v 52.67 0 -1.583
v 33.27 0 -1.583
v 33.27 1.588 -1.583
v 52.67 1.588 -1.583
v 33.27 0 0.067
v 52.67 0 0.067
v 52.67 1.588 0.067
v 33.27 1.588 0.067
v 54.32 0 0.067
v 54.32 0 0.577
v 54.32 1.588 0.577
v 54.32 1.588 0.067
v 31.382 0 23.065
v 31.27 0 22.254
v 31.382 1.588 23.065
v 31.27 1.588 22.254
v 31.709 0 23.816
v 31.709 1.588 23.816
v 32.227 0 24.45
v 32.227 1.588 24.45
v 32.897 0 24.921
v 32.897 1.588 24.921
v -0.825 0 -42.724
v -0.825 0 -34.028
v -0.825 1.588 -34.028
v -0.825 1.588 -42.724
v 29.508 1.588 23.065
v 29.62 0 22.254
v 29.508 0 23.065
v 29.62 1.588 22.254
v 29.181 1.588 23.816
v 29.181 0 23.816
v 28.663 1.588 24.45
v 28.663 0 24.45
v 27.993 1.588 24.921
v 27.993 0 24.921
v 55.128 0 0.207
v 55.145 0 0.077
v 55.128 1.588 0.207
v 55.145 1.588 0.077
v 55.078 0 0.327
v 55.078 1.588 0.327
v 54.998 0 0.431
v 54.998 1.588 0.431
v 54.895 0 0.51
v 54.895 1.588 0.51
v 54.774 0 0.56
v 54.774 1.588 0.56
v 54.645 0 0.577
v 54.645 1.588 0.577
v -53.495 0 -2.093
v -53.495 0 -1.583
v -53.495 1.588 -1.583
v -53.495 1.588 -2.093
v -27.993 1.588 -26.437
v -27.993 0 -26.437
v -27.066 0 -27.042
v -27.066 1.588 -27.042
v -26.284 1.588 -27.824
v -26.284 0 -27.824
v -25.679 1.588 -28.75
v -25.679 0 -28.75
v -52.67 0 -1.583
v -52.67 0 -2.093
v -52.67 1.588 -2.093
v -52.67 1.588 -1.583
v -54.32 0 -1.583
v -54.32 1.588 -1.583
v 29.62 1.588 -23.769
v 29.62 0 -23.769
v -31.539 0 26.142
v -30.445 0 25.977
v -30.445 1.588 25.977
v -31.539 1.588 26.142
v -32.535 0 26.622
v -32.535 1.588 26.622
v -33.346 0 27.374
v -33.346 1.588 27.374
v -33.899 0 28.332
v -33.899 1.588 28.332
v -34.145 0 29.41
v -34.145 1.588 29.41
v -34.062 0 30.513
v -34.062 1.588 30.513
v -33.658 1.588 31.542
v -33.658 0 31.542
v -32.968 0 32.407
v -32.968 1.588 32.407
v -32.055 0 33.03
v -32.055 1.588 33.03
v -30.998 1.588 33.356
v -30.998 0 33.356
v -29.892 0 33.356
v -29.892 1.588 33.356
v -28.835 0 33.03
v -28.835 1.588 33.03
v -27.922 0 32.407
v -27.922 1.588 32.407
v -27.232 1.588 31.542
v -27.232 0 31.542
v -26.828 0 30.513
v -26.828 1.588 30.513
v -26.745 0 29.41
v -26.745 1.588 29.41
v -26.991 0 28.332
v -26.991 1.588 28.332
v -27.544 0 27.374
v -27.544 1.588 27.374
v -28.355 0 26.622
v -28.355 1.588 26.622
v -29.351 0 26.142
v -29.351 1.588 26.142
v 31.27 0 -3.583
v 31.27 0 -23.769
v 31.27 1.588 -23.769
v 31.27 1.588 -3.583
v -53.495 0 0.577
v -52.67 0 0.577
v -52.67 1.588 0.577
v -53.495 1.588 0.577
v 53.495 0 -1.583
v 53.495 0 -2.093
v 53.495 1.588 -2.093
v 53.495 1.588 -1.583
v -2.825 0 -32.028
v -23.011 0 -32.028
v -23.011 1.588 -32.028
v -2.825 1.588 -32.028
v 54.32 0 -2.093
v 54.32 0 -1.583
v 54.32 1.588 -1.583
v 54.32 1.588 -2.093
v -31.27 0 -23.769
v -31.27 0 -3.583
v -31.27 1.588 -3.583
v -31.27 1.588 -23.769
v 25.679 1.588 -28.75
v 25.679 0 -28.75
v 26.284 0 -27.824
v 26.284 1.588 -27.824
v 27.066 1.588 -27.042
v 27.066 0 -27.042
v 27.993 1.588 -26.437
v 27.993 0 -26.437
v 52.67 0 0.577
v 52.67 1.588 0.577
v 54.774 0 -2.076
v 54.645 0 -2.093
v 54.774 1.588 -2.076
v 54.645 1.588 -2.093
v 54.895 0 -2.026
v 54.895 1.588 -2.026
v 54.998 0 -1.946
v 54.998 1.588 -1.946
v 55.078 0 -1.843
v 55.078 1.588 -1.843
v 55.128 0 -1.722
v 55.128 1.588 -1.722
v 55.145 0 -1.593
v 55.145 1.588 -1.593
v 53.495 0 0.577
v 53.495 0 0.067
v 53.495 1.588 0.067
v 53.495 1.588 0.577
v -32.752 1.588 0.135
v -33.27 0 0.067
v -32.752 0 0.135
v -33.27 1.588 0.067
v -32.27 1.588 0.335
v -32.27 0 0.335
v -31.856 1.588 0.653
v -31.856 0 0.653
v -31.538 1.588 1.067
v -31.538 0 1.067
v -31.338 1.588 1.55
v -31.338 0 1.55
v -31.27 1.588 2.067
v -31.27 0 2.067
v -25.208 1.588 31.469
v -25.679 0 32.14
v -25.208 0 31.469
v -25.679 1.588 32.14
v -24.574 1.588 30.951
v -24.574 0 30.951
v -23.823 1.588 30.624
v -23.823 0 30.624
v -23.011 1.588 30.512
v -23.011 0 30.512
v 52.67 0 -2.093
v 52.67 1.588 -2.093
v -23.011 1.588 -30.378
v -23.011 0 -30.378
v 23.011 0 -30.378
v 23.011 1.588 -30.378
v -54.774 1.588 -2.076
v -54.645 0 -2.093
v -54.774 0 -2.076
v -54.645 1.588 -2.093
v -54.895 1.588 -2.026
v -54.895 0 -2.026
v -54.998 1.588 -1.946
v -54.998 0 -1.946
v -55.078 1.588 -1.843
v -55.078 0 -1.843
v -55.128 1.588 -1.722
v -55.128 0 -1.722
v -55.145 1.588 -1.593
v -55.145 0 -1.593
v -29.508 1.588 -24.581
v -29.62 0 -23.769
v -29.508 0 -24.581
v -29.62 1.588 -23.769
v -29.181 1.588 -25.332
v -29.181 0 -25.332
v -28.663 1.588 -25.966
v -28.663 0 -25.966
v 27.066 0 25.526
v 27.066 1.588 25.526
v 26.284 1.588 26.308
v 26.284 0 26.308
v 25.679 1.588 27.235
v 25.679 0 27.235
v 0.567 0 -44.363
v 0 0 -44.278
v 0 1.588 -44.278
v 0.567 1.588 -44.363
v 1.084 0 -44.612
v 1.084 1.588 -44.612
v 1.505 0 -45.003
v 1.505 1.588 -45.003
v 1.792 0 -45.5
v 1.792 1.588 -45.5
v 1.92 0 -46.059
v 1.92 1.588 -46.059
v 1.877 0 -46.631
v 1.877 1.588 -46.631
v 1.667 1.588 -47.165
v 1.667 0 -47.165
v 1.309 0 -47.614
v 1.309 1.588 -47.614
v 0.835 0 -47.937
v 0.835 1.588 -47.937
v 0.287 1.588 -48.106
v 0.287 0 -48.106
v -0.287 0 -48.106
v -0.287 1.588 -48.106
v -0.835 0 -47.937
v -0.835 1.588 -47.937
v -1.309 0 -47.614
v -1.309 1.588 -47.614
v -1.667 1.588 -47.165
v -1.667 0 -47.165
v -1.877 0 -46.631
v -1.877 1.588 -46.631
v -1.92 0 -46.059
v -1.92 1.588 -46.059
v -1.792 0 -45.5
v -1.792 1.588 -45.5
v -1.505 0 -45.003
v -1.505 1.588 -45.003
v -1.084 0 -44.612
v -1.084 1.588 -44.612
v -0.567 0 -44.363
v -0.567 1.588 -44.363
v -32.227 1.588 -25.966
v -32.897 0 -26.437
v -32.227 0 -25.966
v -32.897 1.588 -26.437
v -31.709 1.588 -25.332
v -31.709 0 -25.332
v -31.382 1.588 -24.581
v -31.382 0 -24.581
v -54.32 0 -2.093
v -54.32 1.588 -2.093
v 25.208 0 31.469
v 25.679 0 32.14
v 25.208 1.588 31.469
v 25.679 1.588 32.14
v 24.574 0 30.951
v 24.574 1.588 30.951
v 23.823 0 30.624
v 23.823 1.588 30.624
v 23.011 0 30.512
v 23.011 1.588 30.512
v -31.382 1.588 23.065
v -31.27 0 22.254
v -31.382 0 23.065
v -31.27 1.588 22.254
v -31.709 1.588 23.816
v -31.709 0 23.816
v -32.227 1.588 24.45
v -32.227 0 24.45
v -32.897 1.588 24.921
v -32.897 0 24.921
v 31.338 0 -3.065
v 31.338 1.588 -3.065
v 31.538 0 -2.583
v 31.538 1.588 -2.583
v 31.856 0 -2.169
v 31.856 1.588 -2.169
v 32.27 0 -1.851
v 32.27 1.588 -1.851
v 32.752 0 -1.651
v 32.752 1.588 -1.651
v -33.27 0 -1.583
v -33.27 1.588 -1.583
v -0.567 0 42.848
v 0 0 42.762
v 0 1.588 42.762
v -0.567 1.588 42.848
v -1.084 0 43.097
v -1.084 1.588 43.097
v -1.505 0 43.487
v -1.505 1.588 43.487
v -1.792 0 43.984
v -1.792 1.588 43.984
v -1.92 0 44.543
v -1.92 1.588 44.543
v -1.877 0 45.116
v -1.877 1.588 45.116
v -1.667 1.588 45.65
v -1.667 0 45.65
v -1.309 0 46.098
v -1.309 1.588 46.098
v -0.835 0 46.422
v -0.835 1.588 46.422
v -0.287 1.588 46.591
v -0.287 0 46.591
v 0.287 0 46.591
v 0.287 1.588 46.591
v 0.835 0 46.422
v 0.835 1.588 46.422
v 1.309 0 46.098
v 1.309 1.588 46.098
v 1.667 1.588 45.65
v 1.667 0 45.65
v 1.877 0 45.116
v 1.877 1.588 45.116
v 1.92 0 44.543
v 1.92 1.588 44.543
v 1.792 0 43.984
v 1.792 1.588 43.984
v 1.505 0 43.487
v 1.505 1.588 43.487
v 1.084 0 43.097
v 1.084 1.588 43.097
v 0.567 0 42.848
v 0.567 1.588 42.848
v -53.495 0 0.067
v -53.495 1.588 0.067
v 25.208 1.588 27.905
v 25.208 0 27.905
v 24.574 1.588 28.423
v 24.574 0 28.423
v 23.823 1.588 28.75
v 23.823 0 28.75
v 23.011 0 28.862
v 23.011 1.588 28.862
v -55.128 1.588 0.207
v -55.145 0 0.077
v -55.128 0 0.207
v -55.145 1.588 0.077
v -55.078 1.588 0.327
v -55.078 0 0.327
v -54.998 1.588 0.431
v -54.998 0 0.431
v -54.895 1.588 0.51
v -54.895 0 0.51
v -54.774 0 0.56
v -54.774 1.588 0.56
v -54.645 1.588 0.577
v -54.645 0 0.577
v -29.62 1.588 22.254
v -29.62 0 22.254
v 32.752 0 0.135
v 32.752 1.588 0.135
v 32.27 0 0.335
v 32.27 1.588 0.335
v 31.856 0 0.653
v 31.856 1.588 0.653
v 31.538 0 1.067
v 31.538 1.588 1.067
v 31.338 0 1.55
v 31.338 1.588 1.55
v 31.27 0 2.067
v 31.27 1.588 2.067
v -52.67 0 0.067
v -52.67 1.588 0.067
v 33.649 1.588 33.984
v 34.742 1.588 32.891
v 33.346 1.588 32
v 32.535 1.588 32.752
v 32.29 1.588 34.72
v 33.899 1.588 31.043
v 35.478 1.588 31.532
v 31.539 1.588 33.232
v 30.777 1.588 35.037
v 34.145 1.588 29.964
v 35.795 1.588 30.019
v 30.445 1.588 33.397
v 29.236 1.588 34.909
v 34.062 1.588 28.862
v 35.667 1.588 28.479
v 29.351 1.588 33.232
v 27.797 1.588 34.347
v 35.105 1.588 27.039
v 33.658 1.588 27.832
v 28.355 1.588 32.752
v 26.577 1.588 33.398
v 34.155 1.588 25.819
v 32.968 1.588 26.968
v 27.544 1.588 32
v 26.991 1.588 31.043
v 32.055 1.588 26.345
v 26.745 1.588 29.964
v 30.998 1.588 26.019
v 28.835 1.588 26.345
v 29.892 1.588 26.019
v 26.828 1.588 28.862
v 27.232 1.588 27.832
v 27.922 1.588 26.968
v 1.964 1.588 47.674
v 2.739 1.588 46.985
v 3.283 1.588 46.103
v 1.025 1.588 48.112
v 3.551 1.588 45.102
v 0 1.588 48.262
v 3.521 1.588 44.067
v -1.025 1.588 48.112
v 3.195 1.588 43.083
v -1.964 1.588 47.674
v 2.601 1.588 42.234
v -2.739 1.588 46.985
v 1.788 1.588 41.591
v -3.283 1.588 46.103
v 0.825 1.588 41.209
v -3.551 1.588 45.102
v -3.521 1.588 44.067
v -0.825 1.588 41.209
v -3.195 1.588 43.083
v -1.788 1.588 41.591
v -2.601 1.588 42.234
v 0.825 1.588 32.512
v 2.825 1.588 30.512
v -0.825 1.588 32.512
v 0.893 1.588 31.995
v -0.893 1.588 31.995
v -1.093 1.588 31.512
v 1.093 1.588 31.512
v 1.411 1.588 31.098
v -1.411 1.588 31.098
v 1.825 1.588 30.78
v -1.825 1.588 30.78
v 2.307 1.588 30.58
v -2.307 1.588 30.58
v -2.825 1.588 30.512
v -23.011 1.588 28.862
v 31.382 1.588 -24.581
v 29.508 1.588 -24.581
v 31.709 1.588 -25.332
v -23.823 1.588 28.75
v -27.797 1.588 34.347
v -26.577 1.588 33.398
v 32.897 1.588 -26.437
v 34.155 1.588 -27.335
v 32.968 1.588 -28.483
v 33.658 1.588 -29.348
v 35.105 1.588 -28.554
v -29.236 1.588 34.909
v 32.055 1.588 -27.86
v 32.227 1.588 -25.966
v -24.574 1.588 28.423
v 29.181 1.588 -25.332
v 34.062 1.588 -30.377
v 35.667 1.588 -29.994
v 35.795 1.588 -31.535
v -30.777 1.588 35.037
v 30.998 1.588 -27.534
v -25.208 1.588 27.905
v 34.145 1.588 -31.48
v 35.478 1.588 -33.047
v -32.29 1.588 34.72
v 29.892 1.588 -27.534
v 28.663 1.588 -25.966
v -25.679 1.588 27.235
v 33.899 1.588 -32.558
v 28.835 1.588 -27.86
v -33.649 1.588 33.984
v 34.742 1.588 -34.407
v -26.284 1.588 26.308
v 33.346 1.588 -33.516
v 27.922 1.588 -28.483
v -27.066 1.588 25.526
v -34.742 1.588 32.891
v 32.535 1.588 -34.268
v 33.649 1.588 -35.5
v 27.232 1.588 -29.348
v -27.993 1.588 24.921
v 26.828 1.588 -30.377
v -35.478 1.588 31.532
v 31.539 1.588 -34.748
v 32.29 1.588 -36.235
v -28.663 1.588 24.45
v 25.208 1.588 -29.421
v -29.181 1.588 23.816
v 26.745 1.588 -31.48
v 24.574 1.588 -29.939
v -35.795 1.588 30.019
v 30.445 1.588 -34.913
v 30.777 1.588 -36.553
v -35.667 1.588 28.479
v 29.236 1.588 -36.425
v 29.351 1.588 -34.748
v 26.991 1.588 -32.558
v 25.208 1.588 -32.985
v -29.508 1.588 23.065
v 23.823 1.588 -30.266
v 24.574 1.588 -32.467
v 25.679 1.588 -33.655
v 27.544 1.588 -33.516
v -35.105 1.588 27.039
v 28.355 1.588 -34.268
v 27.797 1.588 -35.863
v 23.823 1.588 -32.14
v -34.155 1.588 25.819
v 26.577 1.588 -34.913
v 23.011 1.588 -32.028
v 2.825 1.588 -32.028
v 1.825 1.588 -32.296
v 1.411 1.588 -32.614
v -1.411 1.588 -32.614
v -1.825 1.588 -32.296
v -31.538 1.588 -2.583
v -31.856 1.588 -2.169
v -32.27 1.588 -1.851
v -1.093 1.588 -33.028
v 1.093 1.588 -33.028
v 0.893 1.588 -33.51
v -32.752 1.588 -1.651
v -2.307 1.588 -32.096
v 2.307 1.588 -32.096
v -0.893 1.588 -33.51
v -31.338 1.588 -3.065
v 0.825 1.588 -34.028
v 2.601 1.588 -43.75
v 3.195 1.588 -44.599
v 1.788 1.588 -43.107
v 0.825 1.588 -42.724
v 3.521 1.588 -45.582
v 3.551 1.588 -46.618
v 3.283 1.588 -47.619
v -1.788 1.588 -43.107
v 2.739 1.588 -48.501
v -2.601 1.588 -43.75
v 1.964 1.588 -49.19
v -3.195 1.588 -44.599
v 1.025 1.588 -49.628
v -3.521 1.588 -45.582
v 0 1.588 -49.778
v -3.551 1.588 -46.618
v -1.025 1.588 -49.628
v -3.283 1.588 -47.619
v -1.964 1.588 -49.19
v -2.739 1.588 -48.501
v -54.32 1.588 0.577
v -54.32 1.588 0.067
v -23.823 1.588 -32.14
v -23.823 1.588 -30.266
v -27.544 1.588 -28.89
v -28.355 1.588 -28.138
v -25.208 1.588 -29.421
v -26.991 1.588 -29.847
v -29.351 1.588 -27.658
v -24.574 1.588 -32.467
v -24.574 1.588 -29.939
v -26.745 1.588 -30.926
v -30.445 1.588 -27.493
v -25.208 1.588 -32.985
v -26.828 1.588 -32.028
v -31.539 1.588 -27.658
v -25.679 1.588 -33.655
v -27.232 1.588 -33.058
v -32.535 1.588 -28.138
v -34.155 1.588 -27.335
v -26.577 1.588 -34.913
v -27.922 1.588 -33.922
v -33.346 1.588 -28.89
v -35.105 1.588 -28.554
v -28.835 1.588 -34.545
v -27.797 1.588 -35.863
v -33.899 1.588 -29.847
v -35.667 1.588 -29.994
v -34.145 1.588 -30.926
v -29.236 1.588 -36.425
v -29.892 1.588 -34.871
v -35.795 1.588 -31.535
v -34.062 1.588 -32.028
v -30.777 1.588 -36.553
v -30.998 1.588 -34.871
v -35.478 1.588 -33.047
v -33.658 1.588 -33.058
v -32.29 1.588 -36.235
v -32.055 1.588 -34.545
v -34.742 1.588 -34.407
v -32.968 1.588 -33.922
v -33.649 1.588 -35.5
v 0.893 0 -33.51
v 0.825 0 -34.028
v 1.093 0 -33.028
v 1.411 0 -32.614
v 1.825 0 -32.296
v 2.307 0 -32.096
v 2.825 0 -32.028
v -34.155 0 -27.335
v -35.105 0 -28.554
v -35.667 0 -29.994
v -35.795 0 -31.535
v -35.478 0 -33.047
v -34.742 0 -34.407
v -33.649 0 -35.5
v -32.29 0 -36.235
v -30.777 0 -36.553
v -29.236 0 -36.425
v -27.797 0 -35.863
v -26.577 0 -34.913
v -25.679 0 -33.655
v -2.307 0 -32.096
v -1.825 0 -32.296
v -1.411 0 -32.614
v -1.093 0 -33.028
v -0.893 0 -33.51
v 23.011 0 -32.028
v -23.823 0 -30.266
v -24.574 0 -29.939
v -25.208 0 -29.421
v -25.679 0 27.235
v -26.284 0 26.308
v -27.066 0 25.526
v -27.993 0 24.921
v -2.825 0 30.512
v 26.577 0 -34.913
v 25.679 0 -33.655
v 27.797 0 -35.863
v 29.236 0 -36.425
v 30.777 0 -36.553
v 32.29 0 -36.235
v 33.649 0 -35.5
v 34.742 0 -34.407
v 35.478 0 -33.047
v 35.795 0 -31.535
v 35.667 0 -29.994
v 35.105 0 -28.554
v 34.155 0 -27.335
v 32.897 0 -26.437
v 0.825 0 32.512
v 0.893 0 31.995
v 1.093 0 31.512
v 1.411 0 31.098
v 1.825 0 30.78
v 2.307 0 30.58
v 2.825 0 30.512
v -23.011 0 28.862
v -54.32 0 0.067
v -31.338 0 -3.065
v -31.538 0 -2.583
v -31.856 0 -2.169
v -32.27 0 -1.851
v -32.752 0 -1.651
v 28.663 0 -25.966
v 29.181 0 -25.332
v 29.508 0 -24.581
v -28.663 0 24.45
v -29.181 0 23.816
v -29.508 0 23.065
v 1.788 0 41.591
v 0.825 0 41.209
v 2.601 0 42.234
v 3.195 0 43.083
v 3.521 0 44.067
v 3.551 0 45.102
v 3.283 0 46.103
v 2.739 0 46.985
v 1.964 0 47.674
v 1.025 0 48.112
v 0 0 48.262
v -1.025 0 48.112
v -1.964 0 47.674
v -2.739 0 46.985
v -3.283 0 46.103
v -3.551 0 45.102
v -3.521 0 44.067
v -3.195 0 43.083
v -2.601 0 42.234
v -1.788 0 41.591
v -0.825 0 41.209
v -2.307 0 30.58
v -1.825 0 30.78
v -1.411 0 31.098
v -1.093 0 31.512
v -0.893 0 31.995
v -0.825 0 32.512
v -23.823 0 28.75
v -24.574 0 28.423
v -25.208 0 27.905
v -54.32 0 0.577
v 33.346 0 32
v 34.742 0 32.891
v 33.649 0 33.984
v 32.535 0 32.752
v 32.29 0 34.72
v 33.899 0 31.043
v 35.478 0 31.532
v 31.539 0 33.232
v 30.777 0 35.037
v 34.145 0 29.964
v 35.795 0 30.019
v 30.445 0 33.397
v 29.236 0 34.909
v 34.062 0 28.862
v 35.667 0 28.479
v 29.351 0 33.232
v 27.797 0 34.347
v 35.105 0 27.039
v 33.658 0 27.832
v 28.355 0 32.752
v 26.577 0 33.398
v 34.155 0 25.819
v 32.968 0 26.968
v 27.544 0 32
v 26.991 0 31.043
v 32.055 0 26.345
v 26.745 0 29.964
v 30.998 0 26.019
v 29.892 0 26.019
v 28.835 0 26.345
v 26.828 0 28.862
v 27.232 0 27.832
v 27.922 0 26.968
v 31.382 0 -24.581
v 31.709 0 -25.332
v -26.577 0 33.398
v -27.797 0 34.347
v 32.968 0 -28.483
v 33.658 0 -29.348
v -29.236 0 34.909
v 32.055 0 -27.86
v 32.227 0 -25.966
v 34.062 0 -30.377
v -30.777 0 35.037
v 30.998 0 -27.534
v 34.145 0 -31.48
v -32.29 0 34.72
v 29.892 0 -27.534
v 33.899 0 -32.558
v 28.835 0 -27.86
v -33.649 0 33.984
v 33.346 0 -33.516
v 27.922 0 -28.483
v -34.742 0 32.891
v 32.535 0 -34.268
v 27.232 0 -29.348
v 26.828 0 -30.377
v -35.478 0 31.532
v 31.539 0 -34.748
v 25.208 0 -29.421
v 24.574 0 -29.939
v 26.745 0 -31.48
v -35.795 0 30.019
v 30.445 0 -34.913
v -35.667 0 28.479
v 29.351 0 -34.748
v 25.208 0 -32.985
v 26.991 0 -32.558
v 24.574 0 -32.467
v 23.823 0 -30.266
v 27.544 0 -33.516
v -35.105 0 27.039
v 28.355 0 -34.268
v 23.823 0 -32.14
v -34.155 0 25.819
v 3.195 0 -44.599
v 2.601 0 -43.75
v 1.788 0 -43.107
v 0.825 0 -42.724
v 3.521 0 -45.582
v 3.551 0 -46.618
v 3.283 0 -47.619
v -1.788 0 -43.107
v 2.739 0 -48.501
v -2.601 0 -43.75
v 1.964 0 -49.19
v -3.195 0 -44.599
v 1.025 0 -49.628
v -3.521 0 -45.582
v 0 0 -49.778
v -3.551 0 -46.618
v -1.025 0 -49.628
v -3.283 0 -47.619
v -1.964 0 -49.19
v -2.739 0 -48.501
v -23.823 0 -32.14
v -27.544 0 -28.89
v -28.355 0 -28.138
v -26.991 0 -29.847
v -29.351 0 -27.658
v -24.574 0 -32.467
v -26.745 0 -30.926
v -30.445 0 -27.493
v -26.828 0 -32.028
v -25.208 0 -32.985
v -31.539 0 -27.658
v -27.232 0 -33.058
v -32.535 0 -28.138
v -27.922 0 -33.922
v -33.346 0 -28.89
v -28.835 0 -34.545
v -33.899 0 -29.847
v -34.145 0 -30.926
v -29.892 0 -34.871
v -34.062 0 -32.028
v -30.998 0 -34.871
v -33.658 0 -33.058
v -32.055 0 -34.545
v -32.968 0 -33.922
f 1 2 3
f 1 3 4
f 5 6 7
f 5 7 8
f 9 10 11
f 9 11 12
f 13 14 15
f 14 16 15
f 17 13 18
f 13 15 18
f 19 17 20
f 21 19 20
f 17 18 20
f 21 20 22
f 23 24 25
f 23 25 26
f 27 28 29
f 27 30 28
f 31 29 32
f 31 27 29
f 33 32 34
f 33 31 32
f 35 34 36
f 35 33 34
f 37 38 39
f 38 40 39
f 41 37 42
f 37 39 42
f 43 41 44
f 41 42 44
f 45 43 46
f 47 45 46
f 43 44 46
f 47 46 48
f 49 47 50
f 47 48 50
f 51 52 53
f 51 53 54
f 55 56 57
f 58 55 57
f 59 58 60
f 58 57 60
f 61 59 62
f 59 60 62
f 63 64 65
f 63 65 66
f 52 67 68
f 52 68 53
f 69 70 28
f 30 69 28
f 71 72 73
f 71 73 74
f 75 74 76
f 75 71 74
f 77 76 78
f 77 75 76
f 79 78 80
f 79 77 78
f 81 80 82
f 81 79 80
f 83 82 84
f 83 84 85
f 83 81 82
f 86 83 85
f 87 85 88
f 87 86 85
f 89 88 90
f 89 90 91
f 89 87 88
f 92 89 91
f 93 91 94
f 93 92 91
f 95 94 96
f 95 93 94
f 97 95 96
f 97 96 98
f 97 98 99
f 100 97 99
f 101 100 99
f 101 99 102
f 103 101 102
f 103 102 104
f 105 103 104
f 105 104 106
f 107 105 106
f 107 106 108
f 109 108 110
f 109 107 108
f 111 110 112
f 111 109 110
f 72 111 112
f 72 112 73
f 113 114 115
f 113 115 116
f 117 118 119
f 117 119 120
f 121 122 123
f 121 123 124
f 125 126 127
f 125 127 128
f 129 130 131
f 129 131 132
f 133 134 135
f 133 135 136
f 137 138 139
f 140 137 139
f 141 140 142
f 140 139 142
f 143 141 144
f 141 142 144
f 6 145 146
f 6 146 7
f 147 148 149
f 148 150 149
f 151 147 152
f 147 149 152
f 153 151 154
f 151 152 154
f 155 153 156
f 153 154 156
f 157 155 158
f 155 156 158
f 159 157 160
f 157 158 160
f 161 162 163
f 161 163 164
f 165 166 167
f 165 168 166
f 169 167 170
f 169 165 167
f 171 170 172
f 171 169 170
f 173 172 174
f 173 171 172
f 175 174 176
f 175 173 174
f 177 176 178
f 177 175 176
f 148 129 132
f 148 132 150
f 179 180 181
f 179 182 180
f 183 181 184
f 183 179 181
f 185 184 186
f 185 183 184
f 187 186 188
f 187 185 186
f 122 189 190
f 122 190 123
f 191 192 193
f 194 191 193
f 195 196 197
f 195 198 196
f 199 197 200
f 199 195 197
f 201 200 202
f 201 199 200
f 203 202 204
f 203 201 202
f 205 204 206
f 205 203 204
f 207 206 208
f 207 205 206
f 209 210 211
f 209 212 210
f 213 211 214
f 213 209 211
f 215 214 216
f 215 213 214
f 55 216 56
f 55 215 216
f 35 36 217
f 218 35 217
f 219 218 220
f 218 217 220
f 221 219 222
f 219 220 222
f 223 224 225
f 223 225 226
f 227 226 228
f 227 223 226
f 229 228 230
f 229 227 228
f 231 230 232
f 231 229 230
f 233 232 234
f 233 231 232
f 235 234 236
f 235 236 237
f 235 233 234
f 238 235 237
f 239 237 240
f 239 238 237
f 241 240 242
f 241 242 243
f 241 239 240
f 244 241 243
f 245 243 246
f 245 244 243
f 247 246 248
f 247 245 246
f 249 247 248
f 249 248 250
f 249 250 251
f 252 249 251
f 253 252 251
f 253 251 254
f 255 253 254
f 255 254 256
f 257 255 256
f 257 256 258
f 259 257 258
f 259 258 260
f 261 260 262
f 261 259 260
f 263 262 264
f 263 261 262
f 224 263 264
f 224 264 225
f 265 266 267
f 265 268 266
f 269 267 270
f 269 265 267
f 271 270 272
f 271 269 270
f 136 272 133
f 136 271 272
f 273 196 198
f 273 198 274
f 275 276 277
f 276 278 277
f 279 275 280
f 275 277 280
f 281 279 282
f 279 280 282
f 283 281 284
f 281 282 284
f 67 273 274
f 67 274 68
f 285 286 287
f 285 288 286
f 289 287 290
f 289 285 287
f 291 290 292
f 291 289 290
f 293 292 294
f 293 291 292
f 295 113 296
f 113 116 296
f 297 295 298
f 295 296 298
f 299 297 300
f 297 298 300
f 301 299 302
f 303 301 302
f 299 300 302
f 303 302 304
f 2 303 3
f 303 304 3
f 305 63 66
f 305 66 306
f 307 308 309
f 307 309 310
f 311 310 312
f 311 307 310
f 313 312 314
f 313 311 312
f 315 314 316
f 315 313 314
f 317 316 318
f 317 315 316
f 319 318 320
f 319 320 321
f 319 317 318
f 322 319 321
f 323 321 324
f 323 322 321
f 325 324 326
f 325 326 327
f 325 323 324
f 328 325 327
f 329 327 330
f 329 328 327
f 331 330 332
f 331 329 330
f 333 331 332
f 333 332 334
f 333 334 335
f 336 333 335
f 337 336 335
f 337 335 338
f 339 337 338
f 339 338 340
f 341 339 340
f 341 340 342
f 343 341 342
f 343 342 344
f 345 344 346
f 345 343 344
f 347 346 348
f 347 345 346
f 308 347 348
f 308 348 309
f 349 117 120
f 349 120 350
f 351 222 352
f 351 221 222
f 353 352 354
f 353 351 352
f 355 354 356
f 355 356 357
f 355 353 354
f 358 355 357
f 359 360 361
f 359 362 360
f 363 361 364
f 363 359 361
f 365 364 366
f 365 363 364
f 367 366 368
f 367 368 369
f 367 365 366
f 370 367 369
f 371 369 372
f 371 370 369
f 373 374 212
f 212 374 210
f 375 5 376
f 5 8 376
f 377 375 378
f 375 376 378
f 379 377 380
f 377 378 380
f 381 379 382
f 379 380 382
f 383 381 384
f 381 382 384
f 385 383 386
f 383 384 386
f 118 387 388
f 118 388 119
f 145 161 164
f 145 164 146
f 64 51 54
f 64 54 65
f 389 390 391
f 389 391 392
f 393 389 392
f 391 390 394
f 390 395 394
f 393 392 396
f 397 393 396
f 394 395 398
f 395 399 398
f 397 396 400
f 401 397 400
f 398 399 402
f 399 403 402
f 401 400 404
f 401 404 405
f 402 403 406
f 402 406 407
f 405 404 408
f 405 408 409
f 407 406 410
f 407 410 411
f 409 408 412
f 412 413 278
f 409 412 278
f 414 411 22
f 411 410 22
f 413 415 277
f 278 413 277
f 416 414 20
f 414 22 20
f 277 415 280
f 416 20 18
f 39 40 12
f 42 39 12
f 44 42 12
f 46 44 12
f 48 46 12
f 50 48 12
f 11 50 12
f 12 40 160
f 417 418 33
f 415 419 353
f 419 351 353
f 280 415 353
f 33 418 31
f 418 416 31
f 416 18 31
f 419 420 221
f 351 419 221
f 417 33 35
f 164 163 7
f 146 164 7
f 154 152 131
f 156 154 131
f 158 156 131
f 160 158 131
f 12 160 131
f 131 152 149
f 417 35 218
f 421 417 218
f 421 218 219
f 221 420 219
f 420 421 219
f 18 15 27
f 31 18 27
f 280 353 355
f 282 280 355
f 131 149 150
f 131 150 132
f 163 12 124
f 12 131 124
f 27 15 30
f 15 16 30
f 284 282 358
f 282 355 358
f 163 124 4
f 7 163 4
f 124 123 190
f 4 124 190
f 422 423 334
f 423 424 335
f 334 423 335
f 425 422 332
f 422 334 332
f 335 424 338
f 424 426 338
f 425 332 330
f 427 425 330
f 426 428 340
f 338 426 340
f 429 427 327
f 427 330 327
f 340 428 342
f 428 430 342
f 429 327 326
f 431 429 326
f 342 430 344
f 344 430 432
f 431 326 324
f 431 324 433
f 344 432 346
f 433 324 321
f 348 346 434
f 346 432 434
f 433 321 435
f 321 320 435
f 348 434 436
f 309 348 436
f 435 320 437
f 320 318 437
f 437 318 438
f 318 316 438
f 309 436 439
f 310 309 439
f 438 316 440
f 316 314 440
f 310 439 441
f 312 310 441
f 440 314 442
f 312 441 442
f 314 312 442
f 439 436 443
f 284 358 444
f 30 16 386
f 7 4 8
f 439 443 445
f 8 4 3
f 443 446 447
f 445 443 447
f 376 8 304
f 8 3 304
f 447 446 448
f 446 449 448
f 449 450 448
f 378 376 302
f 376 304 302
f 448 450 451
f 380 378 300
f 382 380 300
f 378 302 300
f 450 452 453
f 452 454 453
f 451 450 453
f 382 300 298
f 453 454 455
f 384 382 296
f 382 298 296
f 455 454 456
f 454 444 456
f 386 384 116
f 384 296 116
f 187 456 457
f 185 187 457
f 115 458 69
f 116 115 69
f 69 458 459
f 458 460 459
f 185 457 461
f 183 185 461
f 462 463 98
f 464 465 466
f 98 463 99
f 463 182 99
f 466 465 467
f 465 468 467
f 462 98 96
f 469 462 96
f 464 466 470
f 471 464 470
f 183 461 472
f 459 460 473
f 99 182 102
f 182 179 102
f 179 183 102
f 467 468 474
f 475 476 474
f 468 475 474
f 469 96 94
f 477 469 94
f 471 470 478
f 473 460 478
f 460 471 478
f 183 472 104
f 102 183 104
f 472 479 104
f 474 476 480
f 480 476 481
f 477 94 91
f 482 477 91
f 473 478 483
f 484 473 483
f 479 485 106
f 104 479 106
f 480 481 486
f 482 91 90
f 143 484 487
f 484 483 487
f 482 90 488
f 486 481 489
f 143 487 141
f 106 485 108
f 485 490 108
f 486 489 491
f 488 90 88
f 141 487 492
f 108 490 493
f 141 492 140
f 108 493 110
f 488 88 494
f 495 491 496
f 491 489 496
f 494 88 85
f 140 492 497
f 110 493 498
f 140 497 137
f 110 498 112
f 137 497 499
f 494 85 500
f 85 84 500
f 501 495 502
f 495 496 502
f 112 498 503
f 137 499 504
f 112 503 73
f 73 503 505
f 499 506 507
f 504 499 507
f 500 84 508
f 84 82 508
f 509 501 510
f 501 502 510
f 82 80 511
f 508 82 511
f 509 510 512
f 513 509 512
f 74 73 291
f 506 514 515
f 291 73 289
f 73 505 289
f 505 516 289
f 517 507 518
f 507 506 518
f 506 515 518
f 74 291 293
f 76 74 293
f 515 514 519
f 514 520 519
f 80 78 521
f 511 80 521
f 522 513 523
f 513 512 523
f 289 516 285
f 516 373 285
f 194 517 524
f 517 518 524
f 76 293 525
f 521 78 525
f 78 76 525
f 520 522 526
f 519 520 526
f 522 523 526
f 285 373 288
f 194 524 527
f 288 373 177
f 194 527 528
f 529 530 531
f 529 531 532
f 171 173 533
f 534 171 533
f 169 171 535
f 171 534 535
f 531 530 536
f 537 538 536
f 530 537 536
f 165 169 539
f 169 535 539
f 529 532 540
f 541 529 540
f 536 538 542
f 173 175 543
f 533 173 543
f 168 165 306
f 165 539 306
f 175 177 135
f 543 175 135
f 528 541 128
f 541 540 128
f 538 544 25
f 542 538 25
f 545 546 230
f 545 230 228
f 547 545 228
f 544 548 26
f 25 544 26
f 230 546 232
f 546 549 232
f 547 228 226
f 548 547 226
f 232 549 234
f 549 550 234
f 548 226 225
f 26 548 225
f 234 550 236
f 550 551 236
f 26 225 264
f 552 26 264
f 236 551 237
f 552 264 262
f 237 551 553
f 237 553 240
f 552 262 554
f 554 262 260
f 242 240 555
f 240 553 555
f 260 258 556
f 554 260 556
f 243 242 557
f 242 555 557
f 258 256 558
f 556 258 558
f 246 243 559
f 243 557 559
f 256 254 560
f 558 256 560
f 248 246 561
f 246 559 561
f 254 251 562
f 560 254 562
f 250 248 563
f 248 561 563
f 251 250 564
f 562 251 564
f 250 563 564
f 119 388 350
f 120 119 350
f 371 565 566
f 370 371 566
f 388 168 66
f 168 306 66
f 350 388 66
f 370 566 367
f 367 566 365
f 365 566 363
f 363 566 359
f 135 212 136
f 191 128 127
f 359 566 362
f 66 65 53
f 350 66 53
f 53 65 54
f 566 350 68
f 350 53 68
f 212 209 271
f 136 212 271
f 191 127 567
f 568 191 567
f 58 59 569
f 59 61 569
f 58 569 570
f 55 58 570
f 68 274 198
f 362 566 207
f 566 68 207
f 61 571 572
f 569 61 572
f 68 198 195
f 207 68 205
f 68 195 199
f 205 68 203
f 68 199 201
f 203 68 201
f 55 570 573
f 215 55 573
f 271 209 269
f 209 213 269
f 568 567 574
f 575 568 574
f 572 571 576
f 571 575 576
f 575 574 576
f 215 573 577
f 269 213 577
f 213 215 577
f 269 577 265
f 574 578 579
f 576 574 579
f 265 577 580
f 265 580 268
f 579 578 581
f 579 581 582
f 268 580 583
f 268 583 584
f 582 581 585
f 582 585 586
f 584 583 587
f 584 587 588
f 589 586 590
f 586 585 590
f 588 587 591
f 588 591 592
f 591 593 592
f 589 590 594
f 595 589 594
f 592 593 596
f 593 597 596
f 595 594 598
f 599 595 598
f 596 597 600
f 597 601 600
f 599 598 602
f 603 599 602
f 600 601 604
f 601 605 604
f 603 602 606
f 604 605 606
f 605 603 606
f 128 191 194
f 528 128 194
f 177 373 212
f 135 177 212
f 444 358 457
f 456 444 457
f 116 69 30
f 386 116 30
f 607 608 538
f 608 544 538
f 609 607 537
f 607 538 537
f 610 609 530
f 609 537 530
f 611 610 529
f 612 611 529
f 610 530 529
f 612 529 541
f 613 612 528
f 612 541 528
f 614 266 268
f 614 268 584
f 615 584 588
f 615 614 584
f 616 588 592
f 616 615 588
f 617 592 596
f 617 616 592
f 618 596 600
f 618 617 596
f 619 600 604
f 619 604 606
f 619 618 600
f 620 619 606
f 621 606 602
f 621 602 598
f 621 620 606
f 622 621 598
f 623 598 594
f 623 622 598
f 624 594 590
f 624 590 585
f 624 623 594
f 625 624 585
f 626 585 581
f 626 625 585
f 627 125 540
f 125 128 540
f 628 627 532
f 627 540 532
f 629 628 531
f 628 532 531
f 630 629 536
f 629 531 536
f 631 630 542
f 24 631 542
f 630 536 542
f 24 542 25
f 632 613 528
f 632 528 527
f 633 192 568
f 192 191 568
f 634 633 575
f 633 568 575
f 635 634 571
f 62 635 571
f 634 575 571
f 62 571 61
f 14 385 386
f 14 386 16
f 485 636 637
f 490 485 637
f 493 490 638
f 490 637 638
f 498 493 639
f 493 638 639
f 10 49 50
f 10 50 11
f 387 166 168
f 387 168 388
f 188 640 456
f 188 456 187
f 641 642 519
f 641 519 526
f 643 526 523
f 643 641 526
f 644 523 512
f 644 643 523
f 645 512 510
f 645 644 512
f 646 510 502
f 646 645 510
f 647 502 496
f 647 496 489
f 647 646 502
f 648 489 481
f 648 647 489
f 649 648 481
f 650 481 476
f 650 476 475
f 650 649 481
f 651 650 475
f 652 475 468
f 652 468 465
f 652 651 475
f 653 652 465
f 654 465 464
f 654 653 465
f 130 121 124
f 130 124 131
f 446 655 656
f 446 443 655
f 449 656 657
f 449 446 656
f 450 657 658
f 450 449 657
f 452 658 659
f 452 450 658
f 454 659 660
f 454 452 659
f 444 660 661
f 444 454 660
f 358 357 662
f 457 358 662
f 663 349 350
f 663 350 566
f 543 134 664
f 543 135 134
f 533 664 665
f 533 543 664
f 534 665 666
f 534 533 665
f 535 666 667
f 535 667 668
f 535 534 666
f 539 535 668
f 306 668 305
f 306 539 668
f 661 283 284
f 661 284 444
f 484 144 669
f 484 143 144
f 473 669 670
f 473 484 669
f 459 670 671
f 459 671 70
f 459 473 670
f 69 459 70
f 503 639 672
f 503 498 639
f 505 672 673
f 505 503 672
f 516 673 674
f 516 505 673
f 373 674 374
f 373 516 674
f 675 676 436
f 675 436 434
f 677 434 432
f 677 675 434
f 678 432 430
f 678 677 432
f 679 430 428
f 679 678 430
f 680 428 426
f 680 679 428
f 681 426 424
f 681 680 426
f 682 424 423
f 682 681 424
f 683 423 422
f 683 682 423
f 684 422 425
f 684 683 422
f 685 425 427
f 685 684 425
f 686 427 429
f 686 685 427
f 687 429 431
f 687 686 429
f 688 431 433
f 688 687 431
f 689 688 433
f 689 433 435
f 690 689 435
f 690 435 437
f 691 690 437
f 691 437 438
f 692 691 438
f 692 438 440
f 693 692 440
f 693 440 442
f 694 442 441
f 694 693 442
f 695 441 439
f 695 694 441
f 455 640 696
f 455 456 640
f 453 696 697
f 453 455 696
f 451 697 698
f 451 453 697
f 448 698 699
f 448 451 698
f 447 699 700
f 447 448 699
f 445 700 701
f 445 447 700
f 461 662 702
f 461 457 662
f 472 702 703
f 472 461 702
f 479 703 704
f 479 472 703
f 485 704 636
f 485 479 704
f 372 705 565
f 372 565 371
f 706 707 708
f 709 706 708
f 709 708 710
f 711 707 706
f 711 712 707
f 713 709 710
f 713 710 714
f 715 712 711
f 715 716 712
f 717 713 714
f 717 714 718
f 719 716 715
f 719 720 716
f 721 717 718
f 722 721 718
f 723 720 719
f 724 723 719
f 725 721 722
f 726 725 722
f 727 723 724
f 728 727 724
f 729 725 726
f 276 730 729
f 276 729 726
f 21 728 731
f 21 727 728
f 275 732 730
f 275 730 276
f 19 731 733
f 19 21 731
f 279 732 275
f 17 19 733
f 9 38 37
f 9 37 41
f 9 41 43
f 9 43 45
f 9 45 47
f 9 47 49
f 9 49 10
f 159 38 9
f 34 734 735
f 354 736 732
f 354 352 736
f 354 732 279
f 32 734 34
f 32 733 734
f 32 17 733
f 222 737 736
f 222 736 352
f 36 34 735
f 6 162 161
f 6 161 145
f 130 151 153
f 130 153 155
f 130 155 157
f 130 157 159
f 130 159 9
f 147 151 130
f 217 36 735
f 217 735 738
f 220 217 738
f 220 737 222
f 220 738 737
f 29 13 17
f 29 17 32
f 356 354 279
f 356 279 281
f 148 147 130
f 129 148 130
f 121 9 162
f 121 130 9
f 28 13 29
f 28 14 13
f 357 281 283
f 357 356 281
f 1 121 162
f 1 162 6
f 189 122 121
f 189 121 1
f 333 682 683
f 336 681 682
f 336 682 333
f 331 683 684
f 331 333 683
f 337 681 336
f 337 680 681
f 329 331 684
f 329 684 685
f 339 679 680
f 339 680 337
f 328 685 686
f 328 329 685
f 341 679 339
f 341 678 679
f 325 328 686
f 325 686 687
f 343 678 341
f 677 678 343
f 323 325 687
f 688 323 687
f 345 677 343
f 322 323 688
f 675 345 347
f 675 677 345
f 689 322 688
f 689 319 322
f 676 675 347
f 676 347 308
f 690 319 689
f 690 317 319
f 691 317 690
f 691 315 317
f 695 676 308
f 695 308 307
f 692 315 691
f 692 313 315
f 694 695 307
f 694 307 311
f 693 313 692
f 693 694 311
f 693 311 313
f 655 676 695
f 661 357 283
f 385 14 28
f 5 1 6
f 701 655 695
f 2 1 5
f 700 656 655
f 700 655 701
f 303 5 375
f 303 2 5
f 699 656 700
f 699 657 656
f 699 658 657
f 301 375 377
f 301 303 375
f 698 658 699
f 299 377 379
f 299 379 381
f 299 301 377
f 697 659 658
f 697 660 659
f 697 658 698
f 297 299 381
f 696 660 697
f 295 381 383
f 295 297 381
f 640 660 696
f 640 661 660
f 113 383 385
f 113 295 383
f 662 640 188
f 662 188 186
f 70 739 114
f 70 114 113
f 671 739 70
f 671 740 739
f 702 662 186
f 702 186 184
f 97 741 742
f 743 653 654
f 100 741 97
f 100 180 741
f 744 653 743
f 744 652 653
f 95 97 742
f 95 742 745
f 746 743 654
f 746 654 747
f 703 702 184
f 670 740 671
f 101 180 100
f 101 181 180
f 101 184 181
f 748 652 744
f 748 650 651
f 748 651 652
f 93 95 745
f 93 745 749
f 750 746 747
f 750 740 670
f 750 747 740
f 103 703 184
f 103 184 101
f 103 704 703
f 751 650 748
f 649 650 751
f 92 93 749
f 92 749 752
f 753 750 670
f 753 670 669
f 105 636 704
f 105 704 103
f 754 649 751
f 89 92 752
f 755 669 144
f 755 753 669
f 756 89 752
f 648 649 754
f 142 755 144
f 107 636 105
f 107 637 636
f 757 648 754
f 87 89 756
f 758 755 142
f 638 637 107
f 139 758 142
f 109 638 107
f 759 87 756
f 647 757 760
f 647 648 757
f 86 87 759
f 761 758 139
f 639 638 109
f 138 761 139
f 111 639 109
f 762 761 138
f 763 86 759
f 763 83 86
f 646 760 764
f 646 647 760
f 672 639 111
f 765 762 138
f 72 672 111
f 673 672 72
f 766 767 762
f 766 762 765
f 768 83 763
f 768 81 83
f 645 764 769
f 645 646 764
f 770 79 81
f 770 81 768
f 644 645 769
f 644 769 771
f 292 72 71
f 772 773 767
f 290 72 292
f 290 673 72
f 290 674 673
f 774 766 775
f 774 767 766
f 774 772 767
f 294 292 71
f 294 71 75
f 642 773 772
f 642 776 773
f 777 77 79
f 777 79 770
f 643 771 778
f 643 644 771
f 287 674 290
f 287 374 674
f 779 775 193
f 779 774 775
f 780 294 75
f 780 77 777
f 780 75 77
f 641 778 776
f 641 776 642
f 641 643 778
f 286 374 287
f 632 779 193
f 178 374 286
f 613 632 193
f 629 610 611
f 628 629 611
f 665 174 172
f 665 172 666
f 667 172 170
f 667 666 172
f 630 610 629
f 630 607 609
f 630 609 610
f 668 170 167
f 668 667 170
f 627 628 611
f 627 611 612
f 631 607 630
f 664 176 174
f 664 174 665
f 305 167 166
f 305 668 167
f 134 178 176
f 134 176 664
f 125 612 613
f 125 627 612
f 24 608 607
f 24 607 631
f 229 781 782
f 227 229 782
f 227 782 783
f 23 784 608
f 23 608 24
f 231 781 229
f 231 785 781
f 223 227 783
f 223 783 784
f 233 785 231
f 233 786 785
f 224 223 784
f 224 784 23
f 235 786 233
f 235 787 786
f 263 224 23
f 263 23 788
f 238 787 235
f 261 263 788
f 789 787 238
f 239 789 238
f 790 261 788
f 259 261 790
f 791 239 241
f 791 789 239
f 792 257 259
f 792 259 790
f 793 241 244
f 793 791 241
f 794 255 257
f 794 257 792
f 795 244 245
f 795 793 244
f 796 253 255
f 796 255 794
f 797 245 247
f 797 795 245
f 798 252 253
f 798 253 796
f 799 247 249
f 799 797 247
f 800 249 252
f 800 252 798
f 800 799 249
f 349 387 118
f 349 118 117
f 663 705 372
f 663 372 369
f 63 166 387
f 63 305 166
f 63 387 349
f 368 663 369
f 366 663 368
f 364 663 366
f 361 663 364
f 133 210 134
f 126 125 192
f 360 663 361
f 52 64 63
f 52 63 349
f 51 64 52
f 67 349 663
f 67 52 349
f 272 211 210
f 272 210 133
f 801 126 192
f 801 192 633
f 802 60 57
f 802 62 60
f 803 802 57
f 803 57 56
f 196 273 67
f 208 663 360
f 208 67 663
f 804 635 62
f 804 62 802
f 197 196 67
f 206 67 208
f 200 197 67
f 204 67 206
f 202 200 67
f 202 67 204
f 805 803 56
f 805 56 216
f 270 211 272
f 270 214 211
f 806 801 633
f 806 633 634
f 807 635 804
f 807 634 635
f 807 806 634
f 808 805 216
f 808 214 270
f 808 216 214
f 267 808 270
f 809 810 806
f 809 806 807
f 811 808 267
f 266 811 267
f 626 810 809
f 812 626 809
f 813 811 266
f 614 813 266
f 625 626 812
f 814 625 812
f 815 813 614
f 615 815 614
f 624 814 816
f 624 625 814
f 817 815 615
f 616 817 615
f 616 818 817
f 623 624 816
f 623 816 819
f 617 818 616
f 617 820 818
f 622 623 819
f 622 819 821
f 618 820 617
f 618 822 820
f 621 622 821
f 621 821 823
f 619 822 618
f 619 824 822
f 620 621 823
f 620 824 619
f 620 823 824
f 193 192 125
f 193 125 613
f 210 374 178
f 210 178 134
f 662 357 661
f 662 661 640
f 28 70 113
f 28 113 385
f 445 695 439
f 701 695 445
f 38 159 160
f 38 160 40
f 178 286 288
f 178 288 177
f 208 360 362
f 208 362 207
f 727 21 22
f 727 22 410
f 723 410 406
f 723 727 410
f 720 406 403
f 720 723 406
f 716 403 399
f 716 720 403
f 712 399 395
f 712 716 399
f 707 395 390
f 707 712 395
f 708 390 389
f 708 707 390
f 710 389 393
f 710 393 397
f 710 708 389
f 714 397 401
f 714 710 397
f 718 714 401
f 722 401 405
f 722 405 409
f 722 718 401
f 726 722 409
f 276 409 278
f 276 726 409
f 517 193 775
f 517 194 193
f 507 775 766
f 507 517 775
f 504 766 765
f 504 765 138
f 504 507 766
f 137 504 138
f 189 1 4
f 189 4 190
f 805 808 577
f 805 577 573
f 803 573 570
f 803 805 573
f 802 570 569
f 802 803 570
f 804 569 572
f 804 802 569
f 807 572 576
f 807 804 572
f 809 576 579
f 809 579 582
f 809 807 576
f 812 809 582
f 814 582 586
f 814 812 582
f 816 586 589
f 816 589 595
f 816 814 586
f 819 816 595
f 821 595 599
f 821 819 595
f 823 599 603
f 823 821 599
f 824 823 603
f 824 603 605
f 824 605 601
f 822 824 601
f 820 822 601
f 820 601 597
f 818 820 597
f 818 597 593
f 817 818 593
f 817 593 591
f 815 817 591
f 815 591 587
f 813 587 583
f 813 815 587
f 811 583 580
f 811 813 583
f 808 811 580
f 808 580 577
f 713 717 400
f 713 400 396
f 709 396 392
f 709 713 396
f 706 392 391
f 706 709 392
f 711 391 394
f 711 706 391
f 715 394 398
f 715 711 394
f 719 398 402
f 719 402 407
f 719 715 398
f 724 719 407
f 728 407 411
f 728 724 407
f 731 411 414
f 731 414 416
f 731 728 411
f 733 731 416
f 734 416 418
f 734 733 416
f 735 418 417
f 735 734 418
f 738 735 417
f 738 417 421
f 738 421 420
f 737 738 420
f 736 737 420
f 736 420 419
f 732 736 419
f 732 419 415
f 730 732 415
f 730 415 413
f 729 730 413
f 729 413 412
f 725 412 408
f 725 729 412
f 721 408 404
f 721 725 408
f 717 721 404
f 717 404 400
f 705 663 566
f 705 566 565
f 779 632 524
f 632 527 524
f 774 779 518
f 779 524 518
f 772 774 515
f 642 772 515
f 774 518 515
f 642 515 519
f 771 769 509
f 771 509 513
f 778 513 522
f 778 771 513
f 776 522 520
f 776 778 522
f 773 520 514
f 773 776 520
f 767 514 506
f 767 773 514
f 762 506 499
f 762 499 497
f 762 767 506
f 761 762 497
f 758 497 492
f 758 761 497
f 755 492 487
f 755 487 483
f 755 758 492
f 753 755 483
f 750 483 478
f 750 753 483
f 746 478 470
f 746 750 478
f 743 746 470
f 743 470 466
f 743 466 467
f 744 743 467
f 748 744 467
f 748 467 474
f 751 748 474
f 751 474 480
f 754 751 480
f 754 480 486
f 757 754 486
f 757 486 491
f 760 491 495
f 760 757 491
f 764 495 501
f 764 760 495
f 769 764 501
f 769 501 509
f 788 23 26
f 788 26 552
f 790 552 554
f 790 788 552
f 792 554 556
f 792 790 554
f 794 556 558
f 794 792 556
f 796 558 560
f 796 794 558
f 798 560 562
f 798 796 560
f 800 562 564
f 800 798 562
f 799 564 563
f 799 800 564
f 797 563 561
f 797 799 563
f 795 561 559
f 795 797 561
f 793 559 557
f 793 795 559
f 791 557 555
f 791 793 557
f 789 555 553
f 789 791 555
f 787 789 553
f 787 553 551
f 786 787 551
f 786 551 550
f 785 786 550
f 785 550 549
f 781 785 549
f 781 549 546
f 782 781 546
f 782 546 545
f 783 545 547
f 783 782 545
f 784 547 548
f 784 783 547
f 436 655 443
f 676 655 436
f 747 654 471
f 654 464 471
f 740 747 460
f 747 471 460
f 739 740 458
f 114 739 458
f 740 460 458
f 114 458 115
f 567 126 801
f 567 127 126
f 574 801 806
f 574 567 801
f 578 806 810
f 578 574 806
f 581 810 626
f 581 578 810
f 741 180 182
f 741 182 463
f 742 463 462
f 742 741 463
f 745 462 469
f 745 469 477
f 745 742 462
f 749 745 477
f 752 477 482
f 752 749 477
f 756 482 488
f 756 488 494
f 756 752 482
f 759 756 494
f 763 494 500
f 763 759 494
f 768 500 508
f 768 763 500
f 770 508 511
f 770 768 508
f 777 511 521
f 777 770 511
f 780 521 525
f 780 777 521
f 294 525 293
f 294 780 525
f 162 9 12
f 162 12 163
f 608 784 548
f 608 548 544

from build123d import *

# Parameters (mm, degrees)
SKETCH1_R           = 3.71
SKETCH1_R_2         = 1.925
BOSS_EXTRUDE1_DEPTH = 1.5875
FILLET1_R           = 3
FILLET2_R           = 2
FILLET3_R           = 0.5


with BuildPart() as part:
    # Sketch1 → Boss-Extrude1 (new body)
    with BuildSketch(Plane(origin=(0, 0, 0), x_dir=(1, 0, 0), z_dir=(0, 1, 0))):
        with BuildLine():
            Line((-25.148871697, 32.027846467), (-0.825, 32.027846467))
            Line((-0.825, 32.027846467), (-0.825, 42.724341041))
            ThreePointArc((-0.825, 42.724341041), (0, 49.777846467), (0.825, 42.724341041))
            Line((0.825, 42.724341041), (0.825, 32.027846467))
            Line((0.825, 32.027846467), (25.148871697, 32.027846467))
            ThreePointArc((25.148871697, 32.027846467), (34.235092347, 34.992938814), (31.27, 25.906718164))
            Line((31.27, 25.906718164), (31.27, 1.582846467))
            Line((31.27, 1.582846467), (52.669827862, 1.582846467))
            Line((52.669827862, 1.582846467), (52.669827862, 2.092846467))
            Line((52.669827862, 2.092846467), (53.494827862, 2.092846467))
            Line((53.494827862, 2.092846467), (53.494827862, 1.582846467))
            Line((53.494827862, 1.582846467), (54.319827862, 1.582846467))
            Line((54.319827862, 1.582846467), (54.319827862, 2.092846467))
            Line((54.319827862, 2.092846467), (55.144827862, 2.092846467))
            Line((55.144827862, 2.092846467), (55.144827862, -0.577153533))
            Line((55.144827862, -0.577153533), (54.319827862, -0.577153533))
            Line((54.319827862, -0.577153533), (54.319827862, -0.067153533))
            Line((54.319827862, -0.067153533), (53.494827862, -0.067153533))
            Line((53.494827862, -0.067153533), (53.494827862, -0.577153533))
            Line((53.494827862, -0.577153533), (52.669827862, -0.577153533))
            Line((52.669827862, -0.577153533), (52.669827862, -0.067153533))
            Line((52.669827862, -0.067153533), (31.27, -0.067153533))
            Line((31.27, -0.067153533), (31.27, -24.39102523))
            ThreePointArc((31.27, -24.39102523), (34.235092347, -33.47724588), (25.148871697, -30.512153533))
            Line((25.148871697, -30.512153533), (0.825, -30.512153533))
            Line((0.825, -30.512153533), (0.825, -41.208648107))
            ThreePointArc((0.825, -41.208648107), (0, -48.262153533), (-0.825, -41.208648107))
            Line((-0.825, -41.208648107), (-0.825, -30.512153533))
            Line((-0.825, -30.512153533), (-25.148871697, -30.512153533))
            ThreePointArc((-25.148871697, -30.512153533), (-34.235092347, -33.47724588), (-31.27, -24.39102523))
            Line((-31.27, -24.39102523), (-31.27, -0.067153533))
            Line((-31.27, -0.067153533), (-52.669827862, -0.067153533))
            Line((-52.669827862, -0.067153533), (-52.669827862, -0.577153533))
            Line((-52.669827862, -0.577153533), (-53.494827862, -0.577153533))
            Line((-53.494827862, -0.577153533), (-53.494827862, -0.067153533))
            Line((-53.494827862, -0.067153533), (-54.319827862, -0.067153533))
            Line((-54.319827862, -0.067153533), (-54.319827862, -0.577153533))
            Line((-54.319827862, -0.577153533), (-55.144827862, -0.577153533))
            Line((-55.144827862, -0.577153533), (-55.144827862, 2.092846467))
            Line((-55.144827862, 2.092846467), (-54.319827862, 2.092846467))
            Line((-54.319827862, 2.092846467), (-54.319827862, 1.582846467))
            Line((-54.319827862, 1.582846467), (-53.494827862, 1.582846467))
            Line((-53.494827862, 1.582846467), (-53.494827862, 2.092846467))
            Line((-53.494827862, 2.092846467), (-52.669827862, 2.092846467))
            Line((-52.669827862, 2.092846467), (-52.669827862, 1.582846467))
            Line((-52.669827862, 1.582846467), (-31.27, 1.582846467))
            Line((-31.27, 1.582846467), (-31.27, 25.906718164))
            ThreePointArc((-31.27, 25.906718164), (-34.235092347, 34.992938814), (-25.148871697, 32.027846467))
        make_face()
        with Locations(Location((-30.445, 31.202846467, 0), (0, 0, 270))):
            Circle(SKETCH1_R, mode=Mode.SUBTRACT)
        with Locations(Location((30.445, 31.202846467, 0), (0, 0, 90))):
            Circle(SKETCH1_R, mode=Mode.SUBTRACT)
        with Locations(Location((30.445, -29.687153533, 0), (0, 0, 270))):
            Circle(SKETCH1_R, mode=Mode.SUBTRACT)
        with Locations(Location((-30.445, -29.687153533, 0), (0, 0, 90))):
            Circle(SKETCH1_R, mode=Mode.SUBTRACT)
        with Locations(Location((0, 46.202846467, 0), (0, 0, 270))):
            Circle(SKETCH1_R_2, mode=Mode.SUBTRACT)
        with Locations(Location((0, -44.687153533, 0), (0, 0, 90))):
            Circle(SKETCH1_R_2, mode=Mode.SUBTRACT)
        with BuildLine():
            Line((-25.148871697, 30.377846467), (25.148871697, 30.377846467))
            ThreePointArc((25.148871697, 30.377846467), (26.654907653, 27.41275412), (29.62, 25.906718164))
            Line((29.62, 25.906718164), (29.62, -24.39102523))
            ThreePointArc((29.62, -24.39102523), (26.654907653, -25.897061186), (25.148871697, -28.862153533))
            Line((25.148871697, -28.862153533), (-25.148871697, -28.862153533))
            ThreePointArc((-25.148871697, -28.862153533), (-26.654907653, -25.897061186), (-29.62, -24.39102523))
            Line((-29.62, -24.39102523), (-29.62, 25.906718164))
            ThreePointArc((-29.62, 25.906718164), (-26.654907653, 27.41275412), (-25.148871697, 30.377846467))
        make_face(mode=Mode.SUBTRACT)
    extrude(amount=BOSS_EXTRUDE1_DEPTH)

    # Fillet1
    fillet1_edges = [part.edges().sort_by_distance(p)[0] for p in [
        (-25.148871697, 0.79375, -30.377846467),
        (-29.62, 0.79375, -25.906718164),
        (-29.62, 0.79375, 24.39102523),
        (-25.148871697, 0.79375, 28.862153533),
        (25.148871697, 0.79375, 28.862153533),
        (29.62, 0.79375, 24.39102523),
        (29.62, 0.79375, -25.906718164),
        (25.148871697, 0.79375, -30.377846467),
        (31.27, 0.79375, 24.39102523),
        (25.148871697, 0.79375, 30.512153533),
        (-25.148871697, 0.79375, 30.512153533),
        (-31.27, 0.79375, 24.39102523),
        (-31.27, 0.79375, -25.906718164),
        (-25.148871697, 0.79375, -32.027846467),
        (25.148871697, 0.79375, -32.027846467),
        (31.27, 0.79375, -25.906718164),
    ]]
    fillet(fillet1_edges, radius=FILLET1_R)

    # Fillet2
    fillet2_edges = [part.edges().sort_by_distance(p)[0] for p in [
        (31.27, 0.79375, 0.067153533),
        (0.825, 0.79375, 30.512153533),
        (-0.825, 0.79375, 30.512153533),
        (-31.27, 0.79375, 0.067153533),
        (-31.27, 0.79375, -1.582846467),
        (-0.825, 0.79375, -32.027846467),
        (0.825, 0.79375, -32.027846467),
        (31.27, 0.79375, -1.582846467),
    ]]
    fillet(fillet2_edges, radius=FILLET2_R)

    # Fillet3
    fillet3_edges = [part.edges().sort_by_distance(p)[0] for p in [
        (55.144827862, 0.79375, -2.092846467),
        (55.144827862, 0.79375, 0.577153533),
        (-55.144827862, 0.79375, 0.577153533),
        (-55.144827862, 0.79375, -2.092846467),
    ]]
    fillet(fillet3_edges, radius=FILLET3_R)


solid = part.part
